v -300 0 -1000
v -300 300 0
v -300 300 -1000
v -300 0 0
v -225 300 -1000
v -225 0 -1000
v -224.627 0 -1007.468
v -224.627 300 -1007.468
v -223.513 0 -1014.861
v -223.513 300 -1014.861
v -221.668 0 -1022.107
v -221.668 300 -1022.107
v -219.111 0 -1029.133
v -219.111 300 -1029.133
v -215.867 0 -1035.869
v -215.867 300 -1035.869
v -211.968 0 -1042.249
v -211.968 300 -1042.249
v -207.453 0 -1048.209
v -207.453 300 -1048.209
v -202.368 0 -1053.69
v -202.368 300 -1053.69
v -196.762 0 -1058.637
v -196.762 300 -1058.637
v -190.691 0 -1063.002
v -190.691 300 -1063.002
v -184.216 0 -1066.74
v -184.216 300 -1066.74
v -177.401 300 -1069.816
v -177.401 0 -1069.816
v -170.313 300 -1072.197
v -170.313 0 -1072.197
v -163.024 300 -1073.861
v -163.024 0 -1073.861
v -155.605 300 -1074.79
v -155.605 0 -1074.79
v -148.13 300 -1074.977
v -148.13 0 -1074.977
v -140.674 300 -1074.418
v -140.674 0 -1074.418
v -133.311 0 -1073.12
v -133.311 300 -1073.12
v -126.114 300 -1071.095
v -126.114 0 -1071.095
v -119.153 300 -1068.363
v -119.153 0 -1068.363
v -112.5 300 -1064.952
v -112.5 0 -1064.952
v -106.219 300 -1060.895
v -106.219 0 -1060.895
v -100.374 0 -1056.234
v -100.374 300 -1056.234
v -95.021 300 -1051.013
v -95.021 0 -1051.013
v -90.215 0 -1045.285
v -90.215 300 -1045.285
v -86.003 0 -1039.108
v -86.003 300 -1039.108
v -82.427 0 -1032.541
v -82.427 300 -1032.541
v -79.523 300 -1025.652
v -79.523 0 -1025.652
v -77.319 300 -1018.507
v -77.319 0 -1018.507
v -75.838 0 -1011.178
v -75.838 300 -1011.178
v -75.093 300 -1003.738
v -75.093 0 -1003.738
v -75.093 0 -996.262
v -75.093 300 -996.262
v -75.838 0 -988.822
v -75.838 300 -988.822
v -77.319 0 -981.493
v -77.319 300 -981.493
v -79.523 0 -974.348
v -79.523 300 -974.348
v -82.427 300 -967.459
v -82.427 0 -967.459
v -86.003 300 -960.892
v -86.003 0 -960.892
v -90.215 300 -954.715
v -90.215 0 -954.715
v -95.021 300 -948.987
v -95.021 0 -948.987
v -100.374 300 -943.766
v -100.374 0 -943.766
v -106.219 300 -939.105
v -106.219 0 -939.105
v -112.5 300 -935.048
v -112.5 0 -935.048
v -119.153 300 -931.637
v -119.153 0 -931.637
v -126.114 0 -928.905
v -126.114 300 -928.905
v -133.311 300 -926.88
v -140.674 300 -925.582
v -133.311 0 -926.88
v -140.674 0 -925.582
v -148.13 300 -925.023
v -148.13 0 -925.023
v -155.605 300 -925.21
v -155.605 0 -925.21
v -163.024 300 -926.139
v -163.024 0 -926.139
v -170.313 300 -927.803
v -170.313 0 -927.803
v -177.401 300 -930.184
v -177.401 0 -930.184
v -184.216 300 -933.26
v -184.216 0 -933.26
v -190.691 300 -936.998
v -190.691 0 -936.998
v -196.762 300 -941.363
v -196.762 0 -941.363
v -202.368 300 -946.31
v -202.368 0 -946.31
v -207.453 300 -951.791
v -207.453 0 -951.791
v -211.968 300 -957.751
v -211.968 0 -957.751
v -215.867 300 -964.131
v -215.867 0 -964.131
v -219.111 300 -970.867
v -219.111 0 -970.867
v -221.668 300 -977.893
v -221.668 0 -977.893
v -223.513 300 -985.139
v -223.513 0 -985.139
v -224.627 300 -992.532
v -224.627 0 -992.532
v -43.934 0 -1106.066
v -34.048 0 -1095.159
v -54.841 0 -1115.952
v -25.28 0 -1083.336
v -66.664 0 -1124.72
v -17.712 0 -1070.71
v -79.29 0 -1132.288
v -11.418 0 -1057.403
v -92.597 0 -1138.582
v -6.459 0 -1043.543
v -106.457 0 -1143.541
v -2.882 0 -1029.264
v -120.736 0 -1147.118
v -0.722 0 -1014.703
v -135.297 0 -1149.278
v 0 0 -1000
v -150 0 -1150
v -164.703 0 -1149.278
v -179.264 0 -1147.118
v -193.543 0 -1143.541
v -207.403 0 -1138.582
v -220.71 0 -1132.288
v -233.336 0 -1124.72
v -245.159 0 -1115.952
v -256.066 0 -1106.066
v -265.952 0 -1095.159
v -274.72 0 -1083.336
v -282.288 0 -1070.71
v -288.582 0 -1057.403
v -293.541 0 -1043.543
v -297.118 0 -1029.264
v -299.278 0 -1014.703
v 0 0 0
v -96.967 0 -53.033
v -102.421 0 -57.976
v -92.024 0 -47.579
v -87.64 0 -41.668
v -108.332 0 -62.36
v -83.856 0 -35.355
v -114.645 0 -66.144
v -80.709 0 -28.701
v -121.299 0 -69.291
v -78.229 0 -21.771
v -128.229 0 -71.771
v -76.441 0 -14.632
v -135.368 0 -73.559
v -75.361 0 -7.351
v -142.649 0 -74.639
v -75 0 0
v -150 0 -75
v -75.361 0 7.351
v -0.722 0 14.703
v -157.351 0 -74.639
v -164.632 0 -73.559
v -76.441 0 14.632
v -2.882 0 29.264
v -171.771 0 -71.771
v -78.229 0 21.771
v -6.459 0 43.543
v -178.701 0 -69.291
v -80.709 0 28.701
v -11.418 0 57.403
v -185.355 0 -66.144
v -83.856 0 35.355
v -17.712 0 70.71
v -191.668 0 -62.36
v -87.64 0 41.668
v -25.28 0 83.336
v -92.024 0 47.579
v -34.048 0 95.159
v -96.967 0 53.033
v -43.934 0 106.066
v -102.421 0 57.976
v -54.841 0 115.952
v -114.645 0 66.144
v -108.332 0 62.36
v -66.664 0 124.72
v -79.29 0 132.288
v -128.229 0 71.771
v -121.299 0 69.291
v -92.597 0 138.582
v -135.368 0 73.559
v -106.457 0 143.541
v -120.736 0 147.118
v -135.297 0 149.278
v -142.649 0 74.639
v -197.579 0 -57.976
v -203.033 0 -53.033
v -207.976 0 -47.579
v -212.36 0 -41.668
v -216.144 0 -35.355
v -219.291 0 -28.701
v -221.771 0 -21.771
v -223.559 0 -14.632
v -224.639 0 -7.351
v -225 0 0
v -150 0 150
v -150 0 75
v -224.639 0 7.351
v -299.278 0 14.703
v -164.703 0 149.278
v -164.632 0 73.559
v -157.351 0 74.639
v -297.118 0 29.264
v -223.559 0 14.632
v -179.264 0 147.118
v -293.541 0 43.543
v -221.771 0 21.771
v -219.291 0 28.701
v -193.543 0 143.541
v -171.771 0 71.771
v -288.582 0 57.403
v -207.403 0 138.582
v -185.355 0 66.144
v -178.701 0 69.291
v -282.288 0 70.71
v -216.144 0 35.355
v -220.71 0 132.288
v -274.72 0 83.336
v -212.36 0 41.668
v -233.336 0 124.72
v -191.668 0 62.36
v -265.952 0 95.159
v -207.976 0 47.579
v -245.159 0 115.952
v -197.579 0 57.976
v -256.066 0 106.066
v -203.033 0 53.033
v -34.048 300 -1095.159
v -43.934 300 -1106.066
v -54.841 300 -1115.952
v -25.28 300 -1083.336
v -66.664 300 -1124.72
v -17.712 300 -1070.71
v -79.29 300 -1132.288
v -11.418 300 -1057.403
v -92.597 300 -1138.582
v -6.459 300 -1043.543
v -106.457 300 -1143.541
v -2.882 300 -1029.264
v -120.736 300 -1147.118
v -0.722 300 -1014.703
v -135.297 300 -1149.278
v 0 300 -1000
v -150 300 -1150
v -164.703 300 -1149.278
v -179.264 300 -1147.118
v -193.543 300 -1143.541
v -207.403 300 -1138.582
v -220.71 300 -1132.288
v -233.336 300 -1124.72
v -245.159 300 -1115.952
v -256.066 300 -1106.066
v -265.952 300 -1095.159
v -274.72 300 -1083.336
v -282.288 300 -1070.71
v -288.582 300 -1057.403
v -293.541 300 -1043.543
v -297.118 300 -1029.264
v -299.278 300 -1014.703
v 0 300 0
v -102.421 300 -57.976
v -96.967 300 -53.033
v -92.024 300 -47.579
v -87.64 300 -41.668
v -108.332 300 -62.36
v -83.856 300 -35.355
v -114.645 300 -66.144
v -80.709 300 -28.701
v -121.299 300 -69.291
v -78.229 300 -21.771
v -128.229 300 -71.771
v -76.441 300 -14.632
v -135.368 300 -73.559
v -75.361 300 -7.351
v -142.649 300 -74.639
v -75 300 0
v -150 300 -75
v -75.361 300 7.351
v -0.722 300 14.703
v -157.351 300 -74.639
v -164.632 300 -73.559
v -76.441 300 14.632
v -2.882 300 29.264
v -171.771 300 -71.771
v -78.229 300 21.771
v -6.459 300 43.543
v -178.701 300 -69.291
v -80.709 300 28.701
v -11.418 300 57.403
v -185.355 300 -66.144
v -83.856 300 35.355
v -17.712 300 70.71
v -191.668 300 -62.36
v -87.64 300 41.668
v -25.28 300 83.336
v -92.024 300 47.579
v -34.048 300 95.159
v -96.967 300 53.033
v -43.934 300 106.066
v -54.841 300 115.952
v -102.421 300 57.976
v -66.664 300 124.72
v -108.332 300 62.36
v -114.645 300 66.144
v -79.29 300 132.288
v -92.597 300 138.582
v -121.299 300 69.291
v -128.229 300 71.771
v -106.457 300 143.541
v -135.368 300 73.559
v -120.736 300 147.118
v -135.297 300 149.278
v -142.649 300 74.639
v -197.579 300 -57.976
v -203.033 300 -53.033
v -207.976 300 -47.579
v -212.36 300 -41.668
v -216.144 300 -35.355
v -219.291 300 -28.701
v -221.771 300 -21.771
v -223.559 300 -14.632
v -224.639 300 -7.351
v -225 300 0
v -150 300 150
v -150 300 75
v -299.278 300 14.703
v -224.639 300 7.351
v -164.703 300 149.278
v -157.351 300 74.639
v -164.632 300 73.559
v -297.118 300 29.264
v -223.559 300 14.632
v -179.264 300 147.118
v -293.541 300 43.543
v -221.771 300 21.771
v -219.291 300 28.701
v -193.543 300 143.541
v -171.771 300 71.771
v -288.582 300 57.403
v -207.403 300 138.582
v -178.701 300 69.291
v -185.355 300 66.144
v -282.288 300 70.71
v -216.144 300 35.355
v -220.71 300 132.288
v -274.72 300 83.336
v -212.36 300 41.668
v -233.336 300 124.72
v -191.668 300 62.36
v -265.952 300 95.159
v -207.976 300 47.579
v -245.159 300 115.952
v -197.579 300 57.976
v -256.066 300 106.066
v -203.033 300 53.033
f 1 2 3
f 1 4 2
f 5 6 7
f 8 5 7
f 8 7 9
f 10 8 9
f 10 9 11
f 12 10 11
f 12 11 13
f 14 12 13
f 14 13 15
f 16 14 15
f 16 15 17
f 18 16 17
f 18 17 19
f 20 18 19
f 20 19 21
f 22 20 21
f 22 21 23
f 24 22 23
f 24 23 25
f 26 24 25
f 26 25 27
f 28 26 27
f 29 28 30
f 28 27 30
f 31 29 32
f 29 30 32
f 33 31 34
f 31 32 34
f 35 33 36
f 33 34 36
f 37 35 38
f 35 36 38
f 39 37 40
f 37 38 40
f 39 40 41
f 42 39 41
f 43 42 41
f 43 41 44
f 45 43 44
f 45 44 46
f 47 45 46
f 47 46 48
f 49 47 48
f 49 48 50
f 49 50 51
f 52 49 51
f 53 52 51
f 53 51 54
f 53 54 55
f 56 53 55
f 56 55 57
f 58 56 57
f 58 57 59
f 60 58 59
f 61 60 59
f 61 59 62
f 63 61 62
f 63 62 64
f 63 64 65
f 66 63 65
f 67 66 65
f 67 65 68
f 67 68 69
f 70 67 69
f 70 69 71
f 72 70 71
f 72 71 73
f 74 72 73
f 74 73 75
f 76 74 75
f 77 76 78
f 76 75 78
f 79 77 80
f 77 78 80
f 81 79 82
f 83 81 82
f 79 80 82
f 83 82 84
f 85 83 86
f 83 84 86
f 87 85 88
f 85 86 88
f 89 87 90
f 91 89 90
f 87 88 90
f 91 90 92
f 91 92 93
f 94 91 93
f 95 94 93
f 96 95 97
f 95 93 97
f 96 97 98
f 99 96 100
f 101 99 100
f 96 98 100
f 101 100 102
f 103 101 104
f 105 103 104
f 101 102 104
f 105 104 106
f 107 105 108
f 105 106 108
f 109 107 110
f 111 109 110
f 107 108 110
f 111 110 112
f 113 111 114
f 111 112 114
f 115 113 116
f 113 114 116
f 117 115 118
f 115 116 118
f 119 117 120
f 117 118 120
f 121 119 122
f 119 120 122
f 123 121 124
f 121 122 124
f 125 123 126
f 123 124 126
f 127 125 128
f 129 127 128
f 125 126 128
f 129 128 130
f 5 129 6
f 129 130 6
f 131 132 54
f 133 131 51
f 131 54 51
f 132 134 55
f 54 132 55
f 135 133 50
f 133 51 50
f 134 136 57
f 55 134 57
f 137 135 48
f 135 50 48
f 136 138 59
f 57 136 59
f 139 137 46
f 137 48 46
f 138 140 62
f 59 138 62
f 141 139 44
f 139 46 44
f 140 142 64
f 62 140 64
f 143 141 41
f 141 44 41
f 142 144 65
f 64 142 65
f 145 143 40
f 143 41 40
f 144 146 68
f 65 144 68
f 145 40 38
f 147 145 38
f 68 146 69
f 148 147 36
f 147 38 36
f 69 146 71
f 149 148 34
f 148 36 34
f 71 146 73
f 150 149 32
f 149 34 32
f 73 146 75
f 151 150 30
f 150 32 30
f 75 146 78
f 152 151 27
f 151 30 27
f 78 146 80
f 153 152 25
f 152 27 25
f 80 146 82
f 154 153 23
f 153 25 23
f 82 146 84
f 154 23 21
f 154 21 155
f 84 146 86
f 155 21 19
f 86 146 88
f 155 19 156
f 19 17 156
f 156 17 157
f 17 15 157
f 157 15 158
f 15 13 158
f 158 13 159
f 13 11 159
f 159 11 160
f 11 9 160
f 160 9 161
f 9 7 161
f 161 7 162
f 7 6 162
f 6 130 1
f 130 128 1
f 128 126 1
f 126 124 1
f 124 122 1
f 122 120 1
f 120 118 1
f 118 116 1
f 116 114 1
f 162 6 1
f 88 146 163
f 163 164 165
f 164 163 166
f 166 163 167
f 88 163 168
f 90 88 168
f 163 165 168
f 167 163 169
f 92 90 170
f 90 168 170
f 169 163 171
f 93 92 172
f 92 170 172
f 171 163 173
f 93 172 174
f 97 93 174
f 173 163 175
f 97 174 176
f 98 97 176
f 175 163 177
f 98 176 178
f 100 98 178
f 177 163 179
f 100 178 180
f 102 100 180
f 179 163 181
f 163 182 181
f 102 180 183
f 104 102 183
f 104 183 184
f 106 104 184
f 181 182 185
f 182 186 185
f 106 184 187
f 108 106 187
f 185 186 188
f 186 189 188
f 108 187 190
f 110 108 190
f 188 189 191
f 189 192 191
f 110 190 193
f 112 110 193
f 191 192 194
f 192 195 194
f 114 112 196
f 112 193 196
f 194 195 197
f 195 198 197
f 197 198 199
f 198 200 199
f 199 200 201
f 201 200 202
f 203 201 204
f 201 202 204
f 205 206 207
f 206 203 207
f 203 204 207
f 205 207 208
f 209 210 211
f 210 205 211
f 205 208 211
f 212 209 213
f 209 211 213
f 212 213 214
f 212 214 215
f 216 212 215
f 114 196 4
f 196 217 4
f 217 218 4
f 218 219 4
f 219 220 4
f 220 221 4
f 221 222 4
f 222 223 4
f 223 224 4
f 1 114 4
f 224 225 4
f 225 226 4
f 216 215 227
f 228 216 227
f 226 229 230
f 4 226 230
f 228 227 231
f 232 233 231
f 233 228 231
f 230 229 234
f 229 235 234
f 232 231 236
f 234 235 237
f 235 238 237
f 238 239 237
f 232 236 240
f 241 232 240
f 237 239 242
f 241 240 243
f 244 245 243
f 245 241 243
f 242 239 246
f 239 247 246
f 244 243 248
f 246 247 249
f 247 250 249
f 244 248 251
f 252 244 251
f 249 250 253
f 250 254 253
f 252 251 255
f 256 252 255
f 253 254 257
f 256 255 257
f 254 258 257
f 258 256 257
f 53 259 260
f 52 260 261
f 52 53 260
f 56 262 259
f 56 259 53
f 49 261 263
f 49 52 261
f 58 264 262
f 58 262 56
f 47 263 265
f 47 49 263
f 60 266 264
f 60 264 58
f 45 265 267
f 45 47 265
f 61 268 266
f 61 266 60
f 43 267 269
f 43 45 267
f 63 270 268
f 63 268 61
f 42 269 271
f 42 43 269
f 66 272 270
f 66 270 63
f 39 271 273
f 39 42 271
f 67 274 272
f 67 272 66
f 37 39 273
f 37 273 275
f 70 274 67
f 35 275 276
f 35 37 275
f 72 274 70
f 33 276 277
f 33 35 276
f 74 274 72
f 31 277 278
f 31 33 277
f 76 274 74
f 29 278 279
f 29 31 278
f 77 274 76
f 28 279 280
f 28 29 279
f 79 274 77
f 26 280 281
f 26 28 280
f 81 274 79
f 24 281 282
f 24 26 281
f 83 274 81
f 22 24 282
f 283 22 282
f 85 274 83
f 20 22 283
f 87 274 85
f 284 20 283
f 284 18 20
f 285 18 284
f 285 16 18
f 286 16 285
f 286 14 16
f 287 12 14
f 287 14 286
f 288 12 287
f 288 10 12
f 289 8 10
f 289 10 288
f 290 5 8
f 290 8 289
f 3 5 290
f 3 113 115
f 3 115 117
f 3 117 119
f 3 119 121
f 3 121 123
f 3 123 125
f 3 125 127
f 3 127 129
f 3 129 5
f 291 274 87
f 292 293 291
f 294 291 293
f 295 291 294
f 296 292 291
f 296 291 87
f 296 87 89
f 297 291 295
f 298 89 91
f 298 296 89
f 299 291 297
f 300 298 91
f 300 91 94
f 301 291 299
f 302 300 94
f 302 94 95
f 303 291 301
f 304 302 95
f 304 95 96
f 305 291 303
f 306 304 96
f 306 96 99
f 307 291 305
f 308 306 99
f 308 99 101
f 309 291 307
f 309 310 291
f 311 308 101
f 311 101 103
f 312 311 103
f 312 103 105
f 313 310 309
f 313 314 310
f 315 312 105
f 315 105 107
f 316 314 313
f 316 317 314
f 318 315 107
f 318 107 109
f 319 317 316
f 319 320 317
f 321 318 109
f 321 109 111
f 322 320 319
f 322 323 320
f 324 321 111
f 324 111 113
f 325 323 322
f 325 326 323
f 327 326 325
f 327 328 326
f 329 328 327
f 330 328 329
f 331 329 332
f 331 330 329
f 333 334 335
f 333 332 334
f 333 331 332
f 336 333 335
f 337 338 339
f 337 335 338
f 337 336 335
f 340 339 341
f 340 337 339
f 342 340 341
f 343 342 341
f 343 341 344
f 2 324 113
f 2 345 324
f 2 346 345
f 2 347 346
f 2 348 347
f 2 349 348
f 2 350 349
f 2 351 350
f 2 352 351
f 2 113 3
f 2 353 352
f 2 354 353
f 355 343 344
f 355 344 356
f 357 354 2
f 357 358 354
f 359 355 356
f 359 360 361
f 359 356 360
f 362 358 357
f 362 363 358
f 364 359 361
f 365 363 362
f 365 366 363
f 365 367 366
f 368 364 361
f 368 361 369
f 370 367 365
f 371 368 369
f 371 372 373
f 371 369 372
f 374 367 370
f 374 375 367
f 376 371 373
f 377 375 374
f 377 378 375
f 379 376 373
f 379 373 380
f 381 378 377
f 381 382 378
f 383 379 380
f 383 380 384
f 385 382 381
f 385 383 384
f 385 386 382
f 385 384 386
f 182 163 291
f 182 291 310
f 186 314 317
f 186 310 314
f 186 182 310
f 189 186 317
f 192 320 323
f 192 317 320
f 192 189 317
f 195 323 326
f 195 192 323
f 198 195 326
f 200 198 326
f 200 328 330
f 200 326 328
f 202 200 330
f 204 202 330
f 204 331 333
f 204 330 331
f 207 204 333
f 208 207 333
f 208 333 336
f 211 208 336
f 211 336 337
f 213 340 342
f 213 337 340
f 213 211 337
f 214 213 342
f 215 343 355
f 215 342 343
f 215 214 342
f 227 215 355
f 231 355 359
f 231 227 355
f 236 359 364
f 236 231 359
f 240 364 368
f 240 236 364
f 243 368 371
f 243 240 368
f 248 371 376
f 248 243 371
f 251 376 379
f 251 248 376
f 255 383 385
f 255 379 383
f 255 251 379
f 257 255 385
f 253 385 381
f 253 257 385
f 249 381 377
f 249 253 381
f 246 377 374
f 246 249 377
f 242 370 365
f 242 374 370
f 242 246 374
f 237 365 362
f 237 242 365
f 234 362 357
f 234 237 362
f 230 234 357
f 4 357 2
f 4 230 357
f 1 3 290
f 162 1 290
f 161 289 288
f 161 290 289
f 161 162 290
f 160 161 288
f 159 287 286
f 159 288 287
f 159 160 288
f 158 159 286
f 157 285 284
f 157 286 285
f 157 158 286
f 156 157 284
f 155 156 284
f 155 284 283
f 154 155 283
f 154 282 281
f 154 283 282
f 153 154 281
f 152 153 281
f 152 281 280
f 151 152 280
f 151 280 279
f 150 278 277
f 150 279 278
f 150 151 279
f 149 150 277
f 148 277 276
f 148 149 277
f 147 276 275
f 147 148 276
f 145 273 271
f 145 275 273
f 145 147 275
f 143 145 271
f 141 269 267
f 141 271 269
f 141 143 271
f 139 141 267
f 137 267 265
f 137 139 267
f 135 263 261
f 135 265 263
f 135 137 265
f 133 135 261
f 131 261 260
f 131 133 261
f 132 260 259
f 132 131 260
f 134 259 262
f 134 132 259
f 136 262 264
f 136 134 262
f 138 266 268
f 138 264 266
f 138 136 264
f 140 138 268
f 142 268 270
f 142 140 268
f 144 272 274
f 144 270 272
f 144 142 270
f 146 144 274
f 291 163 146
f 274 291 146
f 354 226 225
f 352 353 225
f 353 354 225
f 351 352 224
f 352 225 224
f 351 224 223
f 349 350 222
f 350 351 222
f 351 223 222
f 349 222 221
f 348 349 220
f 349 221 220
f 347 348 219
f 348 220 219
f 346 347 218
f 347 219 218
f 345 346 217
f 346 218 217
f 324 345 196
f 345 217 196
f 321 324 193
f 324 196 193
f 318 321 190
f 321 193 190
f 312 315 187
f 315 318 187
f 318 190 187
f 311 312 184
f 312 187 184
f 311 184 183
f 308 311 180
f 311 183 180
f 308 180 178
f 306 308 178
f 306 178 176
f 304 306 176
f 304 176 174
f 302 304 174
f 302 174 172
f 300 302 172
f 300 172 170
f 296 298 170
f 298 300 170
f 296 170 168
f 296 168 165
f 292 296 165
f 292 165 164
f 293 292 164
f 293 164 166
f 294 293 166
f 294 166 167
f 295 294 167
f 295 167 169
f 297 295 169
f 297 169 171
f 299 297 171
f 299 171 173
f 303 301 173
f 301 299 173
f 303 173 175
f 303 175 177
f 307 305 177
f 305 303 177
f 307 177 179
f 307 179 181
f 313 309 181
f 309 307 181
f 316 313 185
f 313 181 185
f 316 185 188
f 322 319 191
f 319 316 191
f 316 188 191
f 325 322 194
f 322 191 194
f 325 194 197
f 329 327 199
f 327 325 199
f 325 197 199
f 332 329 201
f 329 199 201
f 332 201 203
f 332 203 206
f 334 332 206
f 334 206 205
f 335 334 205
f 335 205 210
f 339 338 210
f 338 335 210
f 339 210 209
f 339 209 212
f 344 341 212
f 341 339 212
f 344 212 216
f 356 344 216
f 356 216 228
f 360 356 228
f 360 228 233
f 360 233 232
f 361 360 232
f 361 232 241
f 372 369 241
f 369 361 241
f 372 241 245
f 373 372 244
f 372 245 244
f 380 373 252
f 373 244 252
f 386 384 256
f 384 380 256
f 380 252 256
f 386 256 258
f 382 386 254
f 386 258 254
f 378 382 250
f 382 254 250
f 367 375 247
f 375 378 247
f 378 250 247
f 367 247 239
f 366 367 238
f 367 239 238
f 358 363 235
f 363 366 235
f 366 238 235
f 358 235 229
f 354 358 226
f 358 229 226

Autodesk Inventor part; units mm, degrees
ref_plane "YZ Plane" through (0, 0, 0) normal (1, 0, 0) x (0, 1, 0)
ref_plane "XZ Plane" through (0, 0, 0) normal (0, 1, 0) x (-1, 0, 0)
ref_plane "XY Plane" through (0, 0, 0) normal (0, 0, 1) x (1, 0, 0)
sketch "Sketch1" plane through (0, 0, 0) normal (0, 1, 0) x (-1, 0, 0)
  line L0 (0, 0) -> (0, -1000)
  line L1 (0, -1000) -> (150, -1000)
  line L2 (150, -1000) -> (150, 0)
  circle A0 centre (150, 0) radius 150
  circle A1 centre (150, -1000) radius 150
  line L3 (300, 0) -> (300, -1000)
  circle A2 centre (150, 0) radius 75
  circle A3 centre (150, -1000) radius 75
  dimension "d0" = 1000
  dimension "d1" = 150
  dimension "d2" = 1000
  dimension "d3" = 150
  dimension "d4" = 150
extrude "Extrusion1" add sketch "Sketch1" along normal blind 300 contours A0 L2 A1 L0 | A0 | A1 L2 A3 L1 | L1 A3 L2 A1 | L3 A1 L2 A0
equation "\"BendRadius\" = Thickness"
equation "\"BendReliefWidth\" = Thickness"
equation "\"BendReliefDepth\" = 0.5 * Thickness"
equation "\"CornerReliefSize\" = 4 * Thickness"
equation "\"MinimumRemnant\" = 2 * Thickness"
equation "\"TransitionRadius\" = BendRadius"
equation "\"JacobiRadiusSize\" = BendRadius"
equation "\"GapSize\" = Thickness"
equation "\"Thickness\" = 0.5"
properties part number "Middle v2" material "Steel"
